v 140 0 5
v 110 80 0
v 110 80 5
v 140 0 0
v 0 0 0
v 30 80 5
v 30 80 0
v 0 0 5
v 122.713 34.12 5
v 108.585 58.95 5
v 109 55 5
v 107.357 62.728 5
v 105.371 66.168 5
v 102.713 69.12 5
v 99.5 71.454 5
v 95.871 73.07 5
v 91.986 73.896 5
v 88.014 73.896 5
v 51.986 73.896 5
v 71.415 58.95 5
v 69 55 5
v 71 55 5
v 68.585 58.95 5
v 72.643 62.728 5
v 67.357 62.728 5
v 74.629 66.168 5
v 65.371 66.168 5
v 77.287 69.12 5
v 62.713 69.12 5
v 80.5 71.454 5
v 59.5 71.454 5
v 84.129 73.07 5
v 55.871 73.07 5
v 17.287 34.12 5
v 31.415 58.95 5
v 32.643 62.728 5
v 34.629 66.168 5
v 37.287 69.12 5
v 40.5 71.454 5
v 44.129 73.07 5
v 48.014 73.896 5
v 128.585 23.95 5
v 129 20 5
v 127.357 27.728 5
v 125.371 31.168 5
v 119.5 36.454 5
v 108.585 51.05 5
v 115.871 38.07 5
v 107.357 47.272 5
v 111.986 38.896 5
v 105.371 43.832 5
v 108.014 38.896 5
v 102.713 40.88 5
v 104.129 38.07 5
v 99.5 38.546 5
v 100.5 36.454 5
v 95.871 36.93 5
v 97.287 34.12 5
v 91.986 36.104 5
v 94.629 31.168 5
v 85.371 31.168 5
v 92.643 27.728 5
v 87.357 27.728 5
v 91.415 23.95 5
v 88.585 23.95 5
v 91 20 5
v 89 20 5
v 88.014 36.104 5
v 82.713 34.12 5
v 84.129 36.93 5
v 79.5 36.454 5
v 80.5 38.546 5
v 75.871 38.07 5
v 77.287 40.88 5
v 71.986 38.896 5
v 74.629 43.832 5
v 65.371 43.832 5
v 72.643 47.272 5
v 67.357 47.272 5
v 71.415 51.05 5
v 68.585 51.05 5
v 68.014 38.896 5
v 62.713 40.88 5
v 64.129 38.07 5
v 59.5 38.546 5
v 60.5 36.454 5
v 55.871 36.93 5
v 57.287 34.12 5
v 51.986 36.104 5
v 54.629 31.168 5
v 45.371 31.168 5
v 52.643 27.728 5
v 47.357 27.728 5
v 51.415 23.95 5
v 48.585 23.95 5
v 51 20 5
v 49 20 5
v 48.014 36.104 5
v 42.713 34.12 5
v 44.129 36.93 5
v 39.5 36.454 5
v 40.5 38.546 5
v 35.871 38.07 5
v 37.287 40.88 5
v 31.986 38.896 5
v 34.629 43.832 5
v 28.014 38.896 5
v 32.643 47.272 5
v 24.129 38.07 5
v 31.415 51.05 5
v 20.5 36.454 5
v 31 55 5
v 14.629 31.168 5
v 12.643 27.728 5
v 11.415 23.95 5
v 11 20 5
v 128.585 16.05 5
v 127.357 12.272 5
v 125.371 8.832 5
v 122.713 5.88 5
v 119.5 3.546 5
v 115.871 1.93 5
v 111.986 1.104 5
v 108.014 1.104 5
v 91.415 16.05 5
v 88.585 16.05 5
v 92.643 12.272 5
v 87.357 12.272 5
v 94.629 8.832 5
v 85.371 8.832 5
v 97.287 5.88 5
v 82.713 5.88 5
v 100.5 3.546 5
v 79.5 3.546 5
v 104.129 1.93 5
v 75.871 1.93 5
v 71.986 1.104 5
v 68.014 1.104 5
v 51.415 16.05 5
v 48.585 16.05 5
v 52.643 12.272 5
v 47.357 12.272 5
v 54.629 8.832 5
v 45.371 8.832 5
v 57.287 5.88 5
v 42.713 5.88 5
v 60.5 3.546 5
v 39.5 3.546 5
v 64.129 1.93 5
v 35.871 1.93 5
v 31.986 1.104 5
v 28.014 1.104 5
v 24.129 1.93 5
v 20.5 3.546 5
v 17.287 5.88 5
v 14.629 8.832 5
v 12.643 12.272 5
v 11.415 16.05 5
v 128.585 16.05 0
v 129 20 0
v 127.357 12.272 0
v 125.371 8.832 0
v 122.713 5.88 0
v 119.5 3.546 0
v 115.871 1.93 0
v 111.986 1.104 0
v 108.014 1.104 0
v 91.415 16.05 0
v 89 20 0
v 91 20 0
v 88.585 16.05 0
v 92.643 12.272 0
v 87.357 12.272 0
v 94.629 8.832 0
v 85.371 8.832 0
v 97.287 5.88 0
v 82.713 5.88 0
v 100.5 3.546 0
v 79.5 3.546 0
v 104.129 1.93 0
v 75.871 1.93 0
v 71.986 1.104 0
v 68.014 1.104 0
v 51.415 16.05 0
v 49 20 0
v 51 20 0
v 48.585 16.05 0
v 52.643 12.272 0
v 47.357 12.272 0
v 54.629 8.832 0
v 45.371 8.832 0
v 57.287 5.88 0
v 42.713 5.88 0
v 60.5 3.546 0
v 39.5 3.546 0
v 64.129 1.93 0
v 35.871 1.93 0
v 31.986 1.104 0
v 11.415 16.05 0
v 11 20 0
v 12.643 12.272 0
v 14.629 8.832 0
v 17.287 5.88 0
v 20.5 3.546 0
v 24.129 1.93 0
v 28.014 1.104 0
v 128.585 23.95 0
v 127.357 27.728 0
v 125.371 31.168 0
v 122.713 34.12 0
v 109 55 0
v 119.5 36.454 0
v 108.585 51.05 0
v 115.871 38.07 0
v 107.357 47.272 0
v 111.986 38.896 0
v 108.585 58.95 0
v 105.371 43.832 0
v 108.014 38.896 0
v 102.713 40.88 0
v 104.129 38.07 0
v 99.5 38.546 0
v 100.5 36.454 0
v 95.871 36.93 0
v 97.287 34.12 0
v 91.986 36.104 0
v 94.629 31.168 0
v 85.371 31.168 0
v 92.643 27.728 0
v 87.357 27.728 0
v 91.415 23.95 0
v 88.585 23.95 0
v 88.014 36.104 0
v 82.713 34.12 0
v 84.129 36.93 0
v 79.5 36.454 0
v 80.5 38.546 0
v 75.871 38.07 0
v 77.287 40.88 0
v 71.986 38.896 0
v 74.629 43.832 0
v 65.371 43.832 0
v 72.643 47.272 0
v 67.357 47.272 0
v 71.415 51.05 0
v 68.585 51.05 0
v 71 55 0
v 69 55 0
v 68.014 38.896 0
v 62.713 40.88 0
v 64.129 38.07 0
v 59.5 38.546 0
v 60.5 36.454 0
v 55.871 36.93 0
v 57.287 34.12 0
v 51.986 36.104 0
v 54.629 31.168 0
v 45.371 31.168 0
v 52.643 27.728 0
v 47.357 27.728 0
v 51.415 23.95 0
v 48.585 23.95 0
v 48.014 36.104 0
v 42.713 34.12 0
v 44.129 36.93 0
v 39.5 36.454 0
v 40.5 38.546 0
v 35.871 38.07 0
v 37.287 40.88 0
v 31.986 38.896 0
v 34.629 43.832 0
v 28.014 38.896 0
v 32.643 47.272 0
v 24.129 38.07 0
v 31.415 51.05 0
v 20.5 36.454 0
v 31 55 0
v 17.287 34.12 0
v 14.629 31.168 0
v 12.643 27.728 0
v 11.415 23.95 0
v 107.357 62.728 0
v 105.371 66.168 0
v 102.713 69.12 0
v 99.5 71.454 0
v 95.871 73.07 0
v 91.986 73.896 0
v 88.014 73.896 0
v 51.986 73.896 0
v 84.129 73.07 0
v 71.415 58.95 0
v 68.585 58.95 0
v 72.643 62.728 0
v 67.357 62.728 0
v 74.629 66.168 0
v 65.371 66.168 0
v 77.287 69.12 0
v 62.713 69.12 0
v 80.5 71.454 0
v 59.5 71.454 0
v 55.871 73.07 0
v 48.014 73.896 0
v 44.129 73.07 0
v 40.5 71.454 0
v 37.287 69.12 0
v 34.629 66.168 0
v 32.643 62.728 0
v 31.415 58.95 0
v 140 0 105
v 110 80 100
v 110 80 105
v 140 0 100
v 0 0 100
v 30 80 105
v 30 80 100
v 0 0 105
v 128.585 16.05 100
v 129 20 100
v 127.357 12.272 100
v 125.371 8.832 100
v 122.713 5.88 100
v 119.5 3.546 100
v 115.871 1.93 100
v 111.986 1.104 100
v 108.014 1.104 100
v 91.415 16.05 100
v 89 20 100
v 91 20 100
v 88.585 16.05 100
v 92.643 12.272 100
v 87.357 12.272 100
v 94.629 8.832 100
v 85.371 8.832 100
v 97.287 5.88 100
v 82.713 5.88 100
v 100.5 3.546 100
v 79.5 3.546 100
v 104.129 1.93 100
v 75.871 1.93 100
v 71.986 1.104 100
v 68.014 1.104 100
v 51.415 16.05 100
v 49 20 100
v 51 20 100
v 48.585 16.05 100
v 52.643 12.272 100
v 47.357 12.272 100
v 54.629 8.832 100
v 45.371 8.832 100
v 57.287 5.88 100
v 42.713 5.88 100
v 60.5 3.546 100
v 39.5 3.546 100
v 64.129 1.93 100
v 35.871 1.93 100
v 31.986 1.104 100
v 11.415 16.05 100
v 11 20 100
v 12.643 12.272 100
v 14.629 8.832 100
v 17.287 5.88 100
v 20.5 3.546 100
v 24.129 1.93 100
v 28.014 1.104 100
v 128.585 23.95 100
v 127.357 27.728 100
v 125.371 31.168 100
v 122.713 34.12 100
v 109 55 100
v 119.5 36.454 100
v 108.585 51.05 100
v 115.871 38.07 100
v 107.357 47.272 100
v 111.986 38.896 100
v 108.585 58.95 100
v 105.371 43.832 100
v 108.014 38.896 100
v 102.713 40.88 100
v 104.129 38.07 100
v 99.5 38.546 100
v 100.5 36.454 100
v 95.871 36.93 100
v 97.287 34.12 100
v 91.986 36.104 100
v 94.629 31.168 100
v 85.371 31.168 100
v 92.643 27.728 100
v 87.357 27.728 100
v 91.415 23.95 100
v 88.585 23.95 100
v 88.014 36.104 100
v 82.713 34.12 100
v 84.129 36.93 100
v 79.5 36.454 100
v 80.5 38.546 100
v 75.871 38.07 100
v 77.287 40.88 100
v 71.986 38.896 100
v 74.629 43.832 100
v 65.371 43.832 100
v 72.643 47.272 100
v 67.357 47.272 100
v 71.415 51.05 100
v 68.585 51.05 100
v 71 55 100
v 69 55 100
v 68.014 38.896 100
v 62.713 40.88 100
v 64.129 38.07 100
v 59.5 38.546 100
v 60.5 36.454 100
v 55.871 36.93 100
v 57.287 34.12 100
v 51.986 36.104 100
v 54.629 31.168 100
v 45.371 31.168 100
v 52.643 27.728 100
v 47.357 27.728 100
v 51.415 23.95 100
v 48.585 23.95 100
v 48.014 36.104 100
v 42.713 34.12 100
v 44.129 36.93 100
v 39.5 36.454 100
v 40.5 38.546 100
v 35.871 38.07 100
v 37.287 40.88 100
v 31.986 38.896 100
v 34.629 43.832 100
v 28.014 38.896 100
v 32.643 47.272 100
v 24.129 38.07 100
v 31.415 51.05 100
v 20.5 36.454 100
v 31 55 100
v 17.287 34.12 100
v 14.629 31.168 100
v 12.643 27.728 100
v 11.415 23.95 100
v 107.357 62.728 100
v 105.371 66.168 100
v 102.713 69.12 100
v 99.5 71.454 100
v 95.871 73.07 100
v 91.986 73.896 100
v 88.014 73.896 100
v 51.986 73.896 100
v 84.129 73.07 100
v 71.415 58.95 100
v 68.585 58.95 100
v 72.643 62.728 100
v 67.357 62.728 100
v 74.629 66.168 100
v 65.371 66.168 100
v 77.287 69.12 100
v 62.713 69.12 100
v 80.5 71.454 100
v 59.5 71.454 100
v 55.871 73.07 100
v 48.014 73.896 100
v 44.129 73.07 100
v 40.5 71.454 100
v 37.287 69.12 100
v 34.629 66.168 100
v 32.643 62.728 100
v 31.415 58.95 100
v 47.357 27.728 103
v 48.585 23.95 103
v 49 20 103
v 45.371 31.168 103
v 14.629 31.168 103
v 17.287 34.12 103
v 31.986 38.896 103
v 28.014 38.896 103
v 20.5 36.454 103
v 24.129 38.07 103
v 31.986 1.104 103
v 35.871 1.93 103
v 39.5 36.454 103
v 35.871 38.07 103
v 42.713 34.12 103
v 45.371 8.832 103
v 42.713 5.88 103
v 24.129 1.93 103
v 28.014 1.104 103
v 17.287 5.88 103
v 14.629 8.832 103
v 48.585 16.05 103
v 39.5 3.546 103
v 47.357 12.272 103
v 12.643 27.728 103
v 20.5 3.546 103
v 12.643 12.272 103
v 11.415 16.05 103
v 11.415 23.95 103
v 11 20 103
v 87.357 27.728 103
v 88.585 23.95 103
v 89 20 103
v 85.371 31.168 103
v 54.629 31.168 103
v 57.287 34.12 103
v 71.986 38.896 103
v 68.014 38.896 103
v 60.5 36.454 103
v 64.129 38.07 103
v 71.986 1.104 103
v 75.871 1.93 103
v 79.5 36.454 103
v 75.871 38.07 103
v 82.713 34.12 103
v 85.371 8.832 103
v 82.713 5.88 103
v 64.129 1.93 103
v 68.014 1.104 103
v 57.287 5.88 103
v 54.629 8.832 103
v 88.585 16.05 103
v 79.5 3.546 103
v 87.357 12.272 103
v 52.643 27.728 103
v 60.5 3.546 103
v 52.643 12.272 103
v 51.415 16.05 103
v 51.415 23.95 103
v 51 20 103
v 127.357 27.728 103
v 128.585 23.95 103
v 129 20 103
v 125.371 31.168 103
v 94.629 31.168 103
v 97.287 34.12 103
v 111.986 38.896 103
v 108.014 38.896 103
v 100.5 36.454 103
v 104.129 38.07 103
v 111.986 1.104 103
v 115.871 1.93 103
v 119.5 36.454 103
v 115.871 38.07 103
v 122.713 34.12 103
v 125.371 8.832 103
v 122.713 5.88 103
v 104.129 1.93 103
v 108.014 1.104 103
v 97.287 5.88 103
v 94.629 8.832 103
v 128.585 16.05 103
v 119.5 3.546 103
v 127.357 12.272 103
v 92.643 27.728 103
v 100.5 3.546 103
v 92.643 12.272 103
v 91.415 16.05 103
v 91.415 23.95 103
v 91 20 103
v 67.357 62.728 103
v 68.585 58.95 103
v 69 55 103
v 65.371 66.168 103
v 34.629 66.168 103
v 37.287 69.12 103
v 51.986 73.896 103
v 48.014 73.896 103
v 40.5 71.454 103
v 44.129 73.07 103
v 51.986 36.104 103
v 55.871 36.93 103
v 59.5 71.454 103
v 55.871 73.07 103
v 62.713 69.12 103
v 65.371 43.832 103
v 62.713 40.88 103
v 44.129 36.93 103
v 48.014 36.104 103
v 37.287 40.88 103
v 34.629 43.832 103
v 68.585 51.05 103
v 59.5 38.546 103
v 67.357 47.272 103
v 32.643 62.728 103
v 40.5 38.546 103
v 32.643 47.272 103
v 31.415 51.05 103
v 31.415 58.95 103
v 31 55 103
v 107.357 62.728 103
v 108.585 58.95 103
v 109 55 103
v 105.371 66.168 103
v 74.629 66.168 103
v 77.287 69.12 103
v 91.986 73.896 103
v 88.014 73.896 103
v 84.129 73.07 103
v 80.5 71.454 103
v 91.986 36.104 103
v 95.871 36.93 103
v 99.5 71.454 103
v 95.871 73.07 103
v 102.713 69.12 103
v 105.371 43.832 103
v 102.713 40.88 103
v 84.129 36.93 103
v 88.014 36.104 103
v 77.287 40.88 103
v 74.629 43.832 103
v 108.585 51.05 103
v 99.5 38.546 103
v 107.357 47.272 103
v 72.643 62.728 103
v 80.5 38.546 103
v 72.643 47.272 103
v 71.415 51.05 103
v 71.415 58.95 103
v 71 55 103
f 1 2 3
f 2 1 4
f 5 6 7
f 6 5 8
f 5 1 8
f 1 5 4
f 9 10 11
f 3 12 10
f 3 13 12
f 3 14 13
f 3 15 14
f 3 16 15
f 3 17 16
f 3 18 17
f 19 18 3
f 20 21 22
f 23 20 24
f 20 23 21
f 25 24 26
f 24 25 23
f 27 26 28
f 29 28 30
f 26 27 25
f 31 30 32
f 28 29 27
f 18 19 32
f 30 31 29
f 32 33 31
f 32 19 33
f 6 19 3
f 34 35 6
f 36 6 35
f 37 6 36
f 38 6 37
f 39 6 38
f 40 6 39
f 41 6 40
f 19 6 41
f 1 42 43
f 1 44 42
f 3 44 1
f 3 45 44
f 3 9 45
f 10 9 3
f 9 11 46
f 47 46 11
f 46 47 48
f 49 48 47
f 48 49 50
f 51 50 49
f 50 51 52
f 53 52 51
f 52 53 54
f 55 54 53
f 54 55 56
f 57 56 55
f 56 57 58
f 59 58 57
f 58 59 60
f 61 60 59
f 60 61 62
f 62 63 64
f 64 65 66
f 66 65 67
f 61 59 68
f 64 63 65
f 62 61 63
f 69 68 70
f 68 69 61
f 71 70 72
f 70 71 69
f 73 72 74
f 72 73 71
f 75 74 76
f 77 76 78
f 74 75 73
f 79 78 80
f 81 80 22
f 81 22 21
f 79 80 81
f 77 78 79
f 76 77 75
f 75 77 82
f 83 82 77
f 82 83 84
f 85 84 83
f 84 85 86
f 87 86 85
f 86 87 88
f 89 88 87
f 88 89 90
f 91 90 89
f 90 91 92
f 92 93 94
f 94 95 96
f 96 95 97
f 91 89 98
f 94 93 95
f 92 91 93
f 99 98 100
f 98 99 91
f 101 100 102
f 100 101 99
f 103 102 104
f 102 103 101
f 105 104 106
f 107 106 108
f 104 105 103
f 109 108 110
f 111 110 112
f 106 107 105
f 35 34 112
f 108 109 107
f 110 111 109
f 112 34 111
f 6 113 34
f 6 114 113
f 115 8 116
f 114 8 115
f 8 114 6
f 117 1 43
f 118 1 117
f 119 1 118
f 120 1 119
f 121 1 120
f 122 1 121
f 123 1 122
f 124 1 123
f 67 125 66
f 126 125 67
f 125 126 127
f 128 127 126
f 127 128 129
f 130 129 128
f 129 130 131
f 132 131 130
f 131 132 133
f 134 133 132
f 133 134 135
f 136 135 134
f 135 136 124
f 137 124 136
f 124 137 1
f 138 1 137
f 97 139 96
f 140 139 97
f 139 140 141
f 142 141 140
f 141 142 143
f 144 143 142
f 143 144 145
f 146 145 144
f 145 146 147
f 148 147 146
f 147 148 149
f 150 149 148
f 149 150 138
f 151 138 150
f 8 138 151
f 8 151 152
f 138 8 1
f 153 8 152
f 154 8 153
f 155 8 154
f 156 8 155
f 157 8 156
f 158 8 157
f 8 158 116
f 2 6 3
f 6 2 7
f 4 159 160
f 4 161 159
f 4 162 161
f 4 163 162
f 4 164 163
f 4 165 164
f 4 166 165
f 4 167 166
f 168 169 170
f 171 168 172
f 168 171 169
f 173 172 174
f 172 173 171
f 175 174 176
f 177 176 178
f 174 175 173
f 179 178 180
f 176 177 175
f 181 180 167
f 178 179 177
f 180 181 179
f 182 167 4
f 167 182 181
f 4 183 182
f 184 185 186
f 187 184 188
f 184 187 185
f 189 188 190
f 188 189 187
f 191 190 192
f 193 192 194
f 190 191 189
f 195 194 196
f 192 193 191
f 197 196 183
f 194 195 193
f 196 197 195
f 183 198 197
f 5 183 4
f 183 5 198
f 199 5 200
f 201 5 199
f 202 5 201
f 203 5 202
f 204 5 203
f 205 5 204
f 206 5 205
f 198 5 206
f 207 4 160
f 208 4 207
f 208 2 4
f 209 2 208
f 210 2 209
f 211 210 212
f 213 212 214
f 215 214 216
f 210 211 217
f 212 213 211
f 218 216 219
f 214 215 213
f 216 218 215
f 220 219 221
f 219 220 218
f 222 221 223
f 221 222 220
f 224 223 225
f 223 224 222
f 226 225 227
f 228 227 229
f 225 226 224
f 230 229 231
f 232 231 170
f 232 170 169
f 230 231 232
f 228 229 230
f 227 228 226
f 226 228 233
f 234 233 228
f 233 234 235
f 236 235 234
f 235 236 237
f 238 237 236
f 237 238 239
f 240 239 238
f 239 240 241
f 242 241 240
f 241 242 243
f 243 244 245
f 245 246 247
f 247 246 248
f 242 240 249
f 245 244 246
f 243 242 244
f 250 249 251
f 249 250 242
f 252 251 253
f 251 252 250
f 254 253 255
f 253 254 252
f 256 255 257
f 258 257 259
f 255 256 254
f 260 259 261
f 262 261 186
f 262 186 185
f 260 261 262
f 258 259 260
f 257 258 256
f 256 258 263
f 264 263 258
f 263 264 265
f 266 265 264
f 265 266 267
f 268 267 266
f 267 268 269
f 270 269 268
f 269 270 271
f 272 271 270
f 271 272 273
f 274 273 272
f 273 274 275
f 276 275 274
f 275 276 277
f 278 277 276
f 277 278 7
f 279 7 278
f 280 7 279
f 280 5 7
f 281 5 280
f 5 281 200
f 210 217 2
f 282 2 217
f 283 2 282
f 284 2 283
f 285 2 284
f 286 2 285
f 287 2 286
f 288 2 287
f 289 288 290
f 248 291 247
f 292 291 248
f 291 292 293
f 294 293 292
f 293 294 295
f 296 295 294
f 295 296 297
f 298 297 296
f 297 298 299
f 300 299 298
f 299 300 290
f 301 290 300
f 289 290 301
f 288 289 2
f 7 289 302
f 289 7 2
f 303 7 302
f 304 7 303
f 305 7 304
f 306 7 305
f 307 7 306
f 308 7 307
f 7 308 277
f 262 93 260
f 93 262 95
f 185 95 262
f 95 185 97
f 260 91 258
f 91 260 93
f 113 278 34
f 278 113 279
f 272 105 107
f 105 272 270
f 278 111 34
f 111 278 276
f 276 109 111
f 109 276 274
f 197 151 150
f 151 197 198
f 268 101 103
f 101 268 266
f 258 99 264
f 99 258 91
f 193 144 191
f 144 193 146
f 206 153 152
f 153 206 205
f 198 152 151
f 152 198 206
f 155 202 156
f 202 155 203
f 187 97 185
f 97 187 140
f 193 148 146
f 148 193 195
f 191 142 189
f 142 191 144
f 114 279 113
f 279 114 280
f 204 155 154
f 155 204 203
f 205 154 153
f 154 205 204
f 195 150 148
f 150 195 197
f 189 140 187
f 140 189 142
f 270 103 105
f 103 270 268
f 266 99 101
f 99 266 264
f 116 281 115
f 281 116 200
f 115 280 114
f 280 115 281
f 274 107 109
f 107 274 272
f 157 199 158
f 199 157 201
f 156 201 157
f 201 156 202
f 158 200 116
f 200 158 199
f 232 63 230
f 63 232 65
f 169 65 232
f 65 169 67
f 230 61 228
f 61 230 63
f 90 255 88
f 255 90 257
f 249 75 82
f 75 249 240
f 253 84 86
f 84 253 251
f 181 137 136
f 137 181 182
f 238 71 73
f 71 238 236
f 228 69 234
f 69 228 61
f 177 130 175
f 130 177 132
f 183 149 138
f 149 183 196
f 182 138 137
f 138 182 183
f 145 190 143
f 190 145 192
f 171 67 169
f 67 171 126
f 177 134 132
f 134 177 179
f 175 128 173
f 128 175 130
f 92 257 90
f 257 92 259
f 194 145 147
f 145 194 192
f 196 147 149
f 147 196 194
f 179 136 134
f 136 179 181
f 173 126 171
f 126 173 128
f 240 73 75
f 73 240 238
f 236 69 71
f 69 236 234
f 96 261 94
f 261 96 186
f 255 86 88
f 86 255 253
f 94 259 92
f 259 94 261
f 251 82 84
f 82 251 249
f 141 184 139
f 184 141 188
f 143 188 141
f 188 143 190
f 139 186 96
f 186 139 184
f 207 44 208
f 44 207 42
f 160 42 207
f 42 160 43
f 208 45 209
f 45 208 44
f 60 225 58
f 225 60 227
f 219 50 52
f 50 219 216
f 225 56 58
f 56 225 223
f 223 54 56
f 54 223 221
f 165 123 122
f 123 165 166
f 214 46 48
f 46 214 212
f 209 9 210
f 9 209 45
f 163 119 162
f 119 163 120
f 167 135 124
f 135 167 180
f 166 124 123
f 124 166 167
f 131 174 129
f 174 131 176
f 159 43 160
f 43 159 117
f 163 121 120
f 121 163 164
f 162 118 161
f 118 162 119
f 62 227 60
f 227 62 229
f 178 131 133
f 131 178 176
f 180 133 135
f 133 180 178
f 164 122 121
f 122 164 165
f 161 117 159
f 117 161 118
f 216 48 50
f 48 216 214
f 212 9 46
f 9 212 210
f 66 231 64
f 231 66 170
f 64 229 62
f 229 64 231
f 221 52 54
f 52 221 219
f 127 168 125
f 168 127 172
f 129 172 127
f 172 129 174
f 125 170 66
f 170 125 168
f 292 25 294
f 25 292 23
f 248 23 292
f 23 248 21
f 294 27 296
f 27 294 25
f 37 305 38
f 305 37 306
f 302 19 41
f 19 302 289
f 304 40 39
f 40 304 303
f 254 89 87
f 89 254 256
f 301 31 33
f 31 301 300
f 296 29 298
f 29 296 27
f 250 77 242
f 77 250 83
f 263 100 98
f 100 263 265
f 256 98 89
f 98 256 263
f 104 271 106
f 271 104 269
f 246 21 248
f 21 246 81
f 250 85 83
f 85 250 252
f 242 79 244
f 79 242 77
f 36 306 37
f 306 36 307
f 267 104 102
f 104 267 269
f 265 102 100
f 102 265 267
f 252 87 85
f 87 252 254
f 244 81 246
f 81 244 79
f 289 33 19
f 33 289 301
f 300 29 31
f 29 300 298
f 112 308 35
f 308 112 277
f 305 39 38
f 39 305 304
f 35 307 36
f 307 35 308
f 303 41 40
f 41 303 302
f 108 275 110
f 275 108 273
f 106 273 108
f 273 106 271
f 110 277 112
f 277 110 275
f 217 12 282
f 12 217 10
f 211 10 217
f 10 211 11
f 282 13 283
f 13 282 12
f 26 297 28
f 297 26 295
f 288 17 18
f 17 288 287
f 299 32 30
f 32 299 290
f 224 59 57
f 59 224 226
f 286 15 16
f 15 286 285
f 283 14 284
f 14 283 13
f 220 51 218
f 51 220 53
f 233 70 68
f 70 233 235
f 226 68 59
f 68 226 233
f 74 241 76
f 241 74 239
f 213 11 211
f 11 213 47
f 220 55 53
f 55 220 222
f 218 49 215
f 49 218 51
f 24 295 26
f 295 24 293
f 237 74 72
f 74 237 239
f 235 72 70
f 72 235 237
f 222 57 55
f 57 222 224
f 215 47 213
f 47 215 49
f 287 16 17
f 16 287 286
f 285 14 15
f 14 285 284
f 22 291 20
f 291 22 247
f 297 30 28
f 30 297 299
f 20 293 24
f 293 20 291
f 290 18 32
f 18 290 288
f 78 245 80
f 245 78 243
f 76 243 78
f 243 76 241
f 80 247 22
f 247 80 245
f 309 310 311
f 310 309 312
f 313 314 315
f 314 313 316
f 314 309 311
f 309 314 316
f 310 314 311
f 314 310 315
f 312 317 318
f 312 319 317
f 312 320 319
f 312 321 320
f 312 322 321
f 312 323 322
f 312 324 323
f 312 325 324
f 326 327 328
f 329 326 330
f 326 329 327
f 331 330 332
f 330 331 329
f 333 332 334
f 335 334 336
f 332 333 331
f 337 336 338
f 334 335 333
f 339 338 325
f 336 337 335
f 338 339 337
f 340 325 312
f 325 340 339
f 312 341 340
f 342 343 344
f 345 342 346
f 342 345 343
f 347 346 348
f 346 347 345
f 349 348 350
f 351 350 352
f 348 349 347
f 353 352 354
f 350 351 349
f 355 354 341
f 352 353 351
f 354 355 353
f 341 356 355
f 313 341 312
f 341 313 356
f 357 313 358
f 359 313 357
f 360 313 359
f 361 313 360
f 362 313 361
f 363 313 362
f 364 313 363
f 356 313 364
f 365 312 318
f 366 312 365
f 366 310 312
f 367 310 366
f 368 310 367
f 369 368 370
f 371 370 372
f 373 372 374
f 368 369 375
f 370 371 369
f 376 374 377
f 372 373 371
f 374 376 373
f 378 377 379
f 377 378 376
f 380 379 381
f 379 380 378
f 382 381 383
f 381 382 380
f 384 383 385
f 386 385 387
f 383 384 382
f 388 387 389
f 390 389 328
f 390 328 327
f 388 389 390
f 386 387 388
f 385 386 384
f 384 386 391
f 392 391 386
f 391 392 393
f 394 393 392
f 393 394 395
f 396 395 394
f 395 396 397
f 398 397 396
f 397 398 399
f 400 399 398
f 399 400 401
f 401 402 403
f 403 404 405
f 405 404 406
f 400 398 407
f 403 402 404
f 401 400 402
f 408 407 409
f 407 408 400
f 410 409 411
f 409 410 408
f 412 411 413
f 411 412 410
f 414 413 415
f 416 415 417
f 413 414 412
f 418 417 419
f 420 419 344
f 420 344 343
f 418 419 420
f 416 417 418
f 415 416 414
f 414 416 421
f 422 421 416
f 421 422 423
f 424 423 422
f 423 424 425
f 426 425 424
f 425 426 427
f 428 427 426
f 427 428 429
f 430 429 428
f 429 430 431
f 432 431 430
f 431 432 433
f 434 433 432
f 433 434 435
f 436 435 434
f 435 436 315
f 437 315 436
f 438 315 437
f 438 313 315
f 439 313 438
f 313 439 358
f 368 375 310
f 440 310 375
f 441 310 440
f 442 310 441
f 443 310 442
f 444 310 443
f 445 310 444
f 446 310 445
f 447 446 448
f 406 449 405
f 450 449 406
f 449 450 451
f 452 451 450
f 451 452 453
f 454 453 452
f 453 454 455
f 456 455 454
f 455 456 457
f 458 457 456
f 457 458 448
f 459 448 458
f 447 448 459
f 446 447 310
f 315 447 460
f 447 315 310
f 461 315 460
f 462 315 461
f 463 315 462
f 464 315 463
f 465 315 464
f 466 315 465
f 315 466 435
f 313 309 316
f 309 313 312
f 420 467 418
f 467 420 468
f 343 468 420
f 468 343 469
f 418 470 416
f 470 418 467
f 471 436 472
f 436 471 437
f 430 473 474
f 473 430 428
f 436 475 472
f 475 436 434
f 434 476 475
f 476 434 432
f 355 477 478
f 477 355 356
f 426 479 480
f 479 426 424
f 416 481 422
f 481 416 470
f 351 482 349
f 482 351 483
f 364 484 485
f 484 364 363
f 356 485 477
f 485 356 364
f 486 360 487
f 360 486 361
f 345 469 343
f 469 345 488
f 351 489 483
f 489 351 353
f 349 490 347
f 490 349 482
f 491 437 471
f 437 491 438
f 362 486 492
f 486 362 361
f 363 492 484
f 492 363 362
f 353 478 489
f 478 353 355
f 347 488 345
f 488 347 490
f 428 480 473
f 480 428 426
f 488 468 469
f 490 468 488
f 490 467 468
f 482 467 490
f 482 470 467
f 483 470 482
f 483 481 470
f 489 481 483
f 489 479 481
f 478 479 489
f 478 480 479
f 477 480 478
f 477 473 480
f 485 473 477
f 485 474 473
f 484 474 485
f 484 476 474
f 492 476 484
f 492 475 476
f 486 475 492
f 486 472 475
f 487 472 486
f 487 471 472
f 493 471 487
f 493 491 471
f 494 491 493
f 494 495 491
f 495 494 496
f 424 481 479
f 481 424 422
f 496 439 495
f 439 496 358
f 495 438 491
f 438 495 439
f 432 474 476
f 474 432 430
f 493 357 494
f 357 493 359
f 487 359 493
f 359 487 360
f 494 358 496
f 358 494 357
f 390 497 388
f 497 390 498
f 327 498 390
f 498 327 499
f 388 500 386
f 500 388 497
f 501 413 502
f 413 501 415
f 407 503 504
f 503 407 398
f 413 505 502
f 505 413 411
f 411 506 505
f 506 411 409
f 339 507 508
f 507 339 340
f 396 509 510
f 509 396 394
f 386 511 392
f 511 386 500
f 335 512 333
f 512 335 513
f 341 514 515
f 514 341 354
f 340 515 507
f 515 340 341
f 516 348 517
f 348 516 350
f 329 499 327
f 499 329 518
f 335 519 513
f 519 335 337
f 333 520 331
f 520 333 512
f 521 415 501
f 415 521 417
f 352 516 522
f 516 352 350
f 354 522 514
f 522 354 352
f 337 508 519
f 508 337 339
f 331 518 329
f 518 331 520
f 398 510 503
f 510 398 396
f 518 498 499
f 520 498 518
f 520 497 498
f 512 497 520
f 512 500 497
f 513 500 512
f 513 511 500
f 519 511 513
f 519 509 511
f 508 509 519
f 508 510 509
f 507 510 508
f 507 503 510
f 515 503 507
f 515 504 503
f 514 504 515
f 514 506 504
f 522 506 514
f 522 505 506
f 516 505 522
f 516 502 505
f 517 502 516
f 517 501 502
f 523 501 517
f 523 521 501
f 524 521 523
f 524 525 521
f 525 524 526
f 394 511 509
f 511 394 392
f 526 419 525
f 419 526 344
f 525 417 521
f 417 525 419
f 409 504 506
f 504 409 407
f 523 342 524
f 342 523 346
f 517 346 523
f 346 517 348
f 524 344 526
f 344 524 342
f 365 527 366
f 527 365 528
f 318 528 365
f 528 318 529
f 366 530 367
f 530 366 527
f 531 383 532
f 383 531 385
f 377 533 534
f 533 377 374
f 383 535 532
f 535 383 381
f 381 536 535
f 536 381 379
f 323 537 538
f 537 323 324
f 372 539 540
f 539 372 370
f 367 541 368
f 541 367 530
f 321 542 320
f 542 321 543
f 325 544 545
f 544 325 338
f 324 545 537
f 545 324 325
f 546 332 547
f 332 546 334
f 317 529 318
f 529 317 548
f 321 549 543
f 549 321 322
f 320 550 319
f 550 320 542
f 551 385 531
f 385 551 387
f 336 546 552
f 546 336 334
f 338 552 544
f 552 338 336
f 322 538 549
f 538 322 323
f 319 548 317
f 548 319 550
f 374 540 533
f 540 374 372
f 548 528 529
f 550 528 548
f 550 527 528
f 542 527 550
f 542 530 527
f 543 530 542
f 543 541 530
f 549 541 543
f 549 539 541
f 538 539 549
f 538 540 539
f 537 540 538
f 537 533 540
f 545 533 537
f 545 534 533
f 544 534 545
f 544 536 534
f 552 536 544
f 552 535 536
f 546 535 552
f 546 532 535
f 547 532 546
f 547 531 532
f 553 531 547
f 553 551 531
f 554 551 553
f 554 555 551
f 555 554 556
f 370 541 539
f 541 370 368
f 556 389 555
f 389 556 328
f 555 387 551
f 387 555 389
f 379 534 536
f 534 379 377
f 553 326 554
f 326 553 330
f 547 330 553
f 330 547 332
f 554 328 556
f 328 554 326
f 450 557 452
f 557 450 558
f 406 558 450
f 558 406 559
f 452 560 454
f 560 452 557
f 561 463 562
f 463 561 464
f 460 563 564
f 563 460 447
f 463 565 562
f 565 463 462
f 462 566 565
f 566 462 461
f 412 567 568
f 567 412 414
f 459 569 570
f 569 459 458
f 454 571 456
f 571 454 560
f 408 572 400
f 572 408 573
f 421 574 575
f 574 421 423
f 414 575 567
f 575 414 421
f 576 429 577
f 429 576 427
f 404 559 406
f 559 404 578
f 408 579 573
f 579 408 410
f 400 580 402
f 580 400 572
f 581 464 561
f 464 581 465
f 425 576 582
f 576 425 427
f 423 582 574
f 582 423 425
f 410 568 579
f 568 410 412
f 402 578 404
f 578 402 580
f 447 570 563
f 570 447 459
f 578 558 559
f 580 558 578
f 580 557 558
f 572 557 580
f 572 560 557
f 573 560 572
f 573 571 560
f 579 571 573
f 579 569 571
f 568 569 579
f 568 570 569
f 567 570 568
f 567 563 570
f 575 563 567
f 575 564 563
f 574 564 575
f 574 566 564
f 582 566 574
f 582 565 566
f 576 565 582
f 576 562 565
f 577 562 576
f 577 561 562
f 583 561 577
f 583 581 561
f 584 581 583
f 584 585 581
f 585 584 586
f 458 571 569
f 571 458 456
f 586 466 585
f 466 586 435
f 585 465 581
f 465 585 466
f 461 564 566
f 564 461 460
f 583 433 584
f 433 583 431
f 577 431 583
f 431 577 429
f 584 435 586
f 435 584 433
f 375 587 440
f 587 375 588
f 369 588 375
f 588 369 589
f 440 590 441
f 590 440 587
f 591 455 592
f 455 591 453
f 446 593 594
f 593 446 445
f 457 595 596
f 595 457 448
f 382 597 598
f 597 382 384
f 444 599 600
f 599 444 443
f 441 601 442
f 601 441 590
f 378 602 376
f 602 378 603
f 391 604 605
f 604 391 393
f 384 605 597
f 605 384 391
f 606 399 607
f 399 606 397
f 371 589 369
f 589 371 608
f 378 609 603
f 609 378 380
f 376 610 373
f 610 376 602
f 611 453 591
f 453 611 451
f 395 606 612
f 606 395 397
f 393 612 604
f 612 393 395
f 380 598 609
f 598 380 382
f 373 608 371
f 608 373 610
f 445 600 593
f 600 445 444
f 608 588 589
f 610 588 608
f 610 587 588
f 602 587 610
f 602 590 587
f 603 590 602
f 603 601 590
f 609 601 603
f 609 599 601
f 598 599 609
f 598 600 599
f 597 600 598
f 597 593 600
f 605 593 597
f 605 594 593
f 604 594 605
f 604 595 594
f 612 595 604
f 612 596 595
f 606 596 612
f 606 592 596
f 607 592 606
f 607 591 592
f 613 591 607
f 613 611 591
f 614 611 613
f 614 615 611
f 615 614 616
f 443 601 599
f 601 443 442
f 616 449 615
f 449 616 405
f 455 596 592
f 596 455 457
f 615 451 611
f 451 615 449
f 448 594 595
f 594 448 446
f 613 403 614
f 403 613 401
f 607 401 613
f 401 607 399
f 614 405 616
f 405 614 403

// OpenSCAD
color("blue")
    difference() {
        trapezoid(140, 80, 80,5);
        translate([30, 20, -1]) cylinder(h=7, r=19);
        translate([70, 20, -1]) cylinder(h=7, r=19);
        translate([110, 20, -1]) cylinder(h=7, r=19);
        translate([50, 55, -1]) cylinder(h=7, r=19);
        translate([90, 55, -1]) cylinder(h=7, r=19);
    }
    
color("green")
    translate([0, 0, 100])
    difference() {
        trapezoid(140, 80, 80,5);
        translate([30, 20, -1]) cylinder(h=4, r=19);
        translate([70, 20, -1]) cylinder(h=4, r=19);
        translate([110, 20, -1]) cylinder(h=4, r=19);
        translate([50, 55, -1]) cylinder(h=4, r=19);
        translate([90, 55, -1]) cylinder(h=4, r=19);
    }
      
module trapezoid(width_base, width_top,height,thickness) {

  linear_extrude(height = thickness) polygon(points=[[0,0],[width_base,0],[width_base-(width_base-width_top)/2,height],[(width_base-width_top)/2,height]], paths=[[0,1,2,3]]); 
  
}
